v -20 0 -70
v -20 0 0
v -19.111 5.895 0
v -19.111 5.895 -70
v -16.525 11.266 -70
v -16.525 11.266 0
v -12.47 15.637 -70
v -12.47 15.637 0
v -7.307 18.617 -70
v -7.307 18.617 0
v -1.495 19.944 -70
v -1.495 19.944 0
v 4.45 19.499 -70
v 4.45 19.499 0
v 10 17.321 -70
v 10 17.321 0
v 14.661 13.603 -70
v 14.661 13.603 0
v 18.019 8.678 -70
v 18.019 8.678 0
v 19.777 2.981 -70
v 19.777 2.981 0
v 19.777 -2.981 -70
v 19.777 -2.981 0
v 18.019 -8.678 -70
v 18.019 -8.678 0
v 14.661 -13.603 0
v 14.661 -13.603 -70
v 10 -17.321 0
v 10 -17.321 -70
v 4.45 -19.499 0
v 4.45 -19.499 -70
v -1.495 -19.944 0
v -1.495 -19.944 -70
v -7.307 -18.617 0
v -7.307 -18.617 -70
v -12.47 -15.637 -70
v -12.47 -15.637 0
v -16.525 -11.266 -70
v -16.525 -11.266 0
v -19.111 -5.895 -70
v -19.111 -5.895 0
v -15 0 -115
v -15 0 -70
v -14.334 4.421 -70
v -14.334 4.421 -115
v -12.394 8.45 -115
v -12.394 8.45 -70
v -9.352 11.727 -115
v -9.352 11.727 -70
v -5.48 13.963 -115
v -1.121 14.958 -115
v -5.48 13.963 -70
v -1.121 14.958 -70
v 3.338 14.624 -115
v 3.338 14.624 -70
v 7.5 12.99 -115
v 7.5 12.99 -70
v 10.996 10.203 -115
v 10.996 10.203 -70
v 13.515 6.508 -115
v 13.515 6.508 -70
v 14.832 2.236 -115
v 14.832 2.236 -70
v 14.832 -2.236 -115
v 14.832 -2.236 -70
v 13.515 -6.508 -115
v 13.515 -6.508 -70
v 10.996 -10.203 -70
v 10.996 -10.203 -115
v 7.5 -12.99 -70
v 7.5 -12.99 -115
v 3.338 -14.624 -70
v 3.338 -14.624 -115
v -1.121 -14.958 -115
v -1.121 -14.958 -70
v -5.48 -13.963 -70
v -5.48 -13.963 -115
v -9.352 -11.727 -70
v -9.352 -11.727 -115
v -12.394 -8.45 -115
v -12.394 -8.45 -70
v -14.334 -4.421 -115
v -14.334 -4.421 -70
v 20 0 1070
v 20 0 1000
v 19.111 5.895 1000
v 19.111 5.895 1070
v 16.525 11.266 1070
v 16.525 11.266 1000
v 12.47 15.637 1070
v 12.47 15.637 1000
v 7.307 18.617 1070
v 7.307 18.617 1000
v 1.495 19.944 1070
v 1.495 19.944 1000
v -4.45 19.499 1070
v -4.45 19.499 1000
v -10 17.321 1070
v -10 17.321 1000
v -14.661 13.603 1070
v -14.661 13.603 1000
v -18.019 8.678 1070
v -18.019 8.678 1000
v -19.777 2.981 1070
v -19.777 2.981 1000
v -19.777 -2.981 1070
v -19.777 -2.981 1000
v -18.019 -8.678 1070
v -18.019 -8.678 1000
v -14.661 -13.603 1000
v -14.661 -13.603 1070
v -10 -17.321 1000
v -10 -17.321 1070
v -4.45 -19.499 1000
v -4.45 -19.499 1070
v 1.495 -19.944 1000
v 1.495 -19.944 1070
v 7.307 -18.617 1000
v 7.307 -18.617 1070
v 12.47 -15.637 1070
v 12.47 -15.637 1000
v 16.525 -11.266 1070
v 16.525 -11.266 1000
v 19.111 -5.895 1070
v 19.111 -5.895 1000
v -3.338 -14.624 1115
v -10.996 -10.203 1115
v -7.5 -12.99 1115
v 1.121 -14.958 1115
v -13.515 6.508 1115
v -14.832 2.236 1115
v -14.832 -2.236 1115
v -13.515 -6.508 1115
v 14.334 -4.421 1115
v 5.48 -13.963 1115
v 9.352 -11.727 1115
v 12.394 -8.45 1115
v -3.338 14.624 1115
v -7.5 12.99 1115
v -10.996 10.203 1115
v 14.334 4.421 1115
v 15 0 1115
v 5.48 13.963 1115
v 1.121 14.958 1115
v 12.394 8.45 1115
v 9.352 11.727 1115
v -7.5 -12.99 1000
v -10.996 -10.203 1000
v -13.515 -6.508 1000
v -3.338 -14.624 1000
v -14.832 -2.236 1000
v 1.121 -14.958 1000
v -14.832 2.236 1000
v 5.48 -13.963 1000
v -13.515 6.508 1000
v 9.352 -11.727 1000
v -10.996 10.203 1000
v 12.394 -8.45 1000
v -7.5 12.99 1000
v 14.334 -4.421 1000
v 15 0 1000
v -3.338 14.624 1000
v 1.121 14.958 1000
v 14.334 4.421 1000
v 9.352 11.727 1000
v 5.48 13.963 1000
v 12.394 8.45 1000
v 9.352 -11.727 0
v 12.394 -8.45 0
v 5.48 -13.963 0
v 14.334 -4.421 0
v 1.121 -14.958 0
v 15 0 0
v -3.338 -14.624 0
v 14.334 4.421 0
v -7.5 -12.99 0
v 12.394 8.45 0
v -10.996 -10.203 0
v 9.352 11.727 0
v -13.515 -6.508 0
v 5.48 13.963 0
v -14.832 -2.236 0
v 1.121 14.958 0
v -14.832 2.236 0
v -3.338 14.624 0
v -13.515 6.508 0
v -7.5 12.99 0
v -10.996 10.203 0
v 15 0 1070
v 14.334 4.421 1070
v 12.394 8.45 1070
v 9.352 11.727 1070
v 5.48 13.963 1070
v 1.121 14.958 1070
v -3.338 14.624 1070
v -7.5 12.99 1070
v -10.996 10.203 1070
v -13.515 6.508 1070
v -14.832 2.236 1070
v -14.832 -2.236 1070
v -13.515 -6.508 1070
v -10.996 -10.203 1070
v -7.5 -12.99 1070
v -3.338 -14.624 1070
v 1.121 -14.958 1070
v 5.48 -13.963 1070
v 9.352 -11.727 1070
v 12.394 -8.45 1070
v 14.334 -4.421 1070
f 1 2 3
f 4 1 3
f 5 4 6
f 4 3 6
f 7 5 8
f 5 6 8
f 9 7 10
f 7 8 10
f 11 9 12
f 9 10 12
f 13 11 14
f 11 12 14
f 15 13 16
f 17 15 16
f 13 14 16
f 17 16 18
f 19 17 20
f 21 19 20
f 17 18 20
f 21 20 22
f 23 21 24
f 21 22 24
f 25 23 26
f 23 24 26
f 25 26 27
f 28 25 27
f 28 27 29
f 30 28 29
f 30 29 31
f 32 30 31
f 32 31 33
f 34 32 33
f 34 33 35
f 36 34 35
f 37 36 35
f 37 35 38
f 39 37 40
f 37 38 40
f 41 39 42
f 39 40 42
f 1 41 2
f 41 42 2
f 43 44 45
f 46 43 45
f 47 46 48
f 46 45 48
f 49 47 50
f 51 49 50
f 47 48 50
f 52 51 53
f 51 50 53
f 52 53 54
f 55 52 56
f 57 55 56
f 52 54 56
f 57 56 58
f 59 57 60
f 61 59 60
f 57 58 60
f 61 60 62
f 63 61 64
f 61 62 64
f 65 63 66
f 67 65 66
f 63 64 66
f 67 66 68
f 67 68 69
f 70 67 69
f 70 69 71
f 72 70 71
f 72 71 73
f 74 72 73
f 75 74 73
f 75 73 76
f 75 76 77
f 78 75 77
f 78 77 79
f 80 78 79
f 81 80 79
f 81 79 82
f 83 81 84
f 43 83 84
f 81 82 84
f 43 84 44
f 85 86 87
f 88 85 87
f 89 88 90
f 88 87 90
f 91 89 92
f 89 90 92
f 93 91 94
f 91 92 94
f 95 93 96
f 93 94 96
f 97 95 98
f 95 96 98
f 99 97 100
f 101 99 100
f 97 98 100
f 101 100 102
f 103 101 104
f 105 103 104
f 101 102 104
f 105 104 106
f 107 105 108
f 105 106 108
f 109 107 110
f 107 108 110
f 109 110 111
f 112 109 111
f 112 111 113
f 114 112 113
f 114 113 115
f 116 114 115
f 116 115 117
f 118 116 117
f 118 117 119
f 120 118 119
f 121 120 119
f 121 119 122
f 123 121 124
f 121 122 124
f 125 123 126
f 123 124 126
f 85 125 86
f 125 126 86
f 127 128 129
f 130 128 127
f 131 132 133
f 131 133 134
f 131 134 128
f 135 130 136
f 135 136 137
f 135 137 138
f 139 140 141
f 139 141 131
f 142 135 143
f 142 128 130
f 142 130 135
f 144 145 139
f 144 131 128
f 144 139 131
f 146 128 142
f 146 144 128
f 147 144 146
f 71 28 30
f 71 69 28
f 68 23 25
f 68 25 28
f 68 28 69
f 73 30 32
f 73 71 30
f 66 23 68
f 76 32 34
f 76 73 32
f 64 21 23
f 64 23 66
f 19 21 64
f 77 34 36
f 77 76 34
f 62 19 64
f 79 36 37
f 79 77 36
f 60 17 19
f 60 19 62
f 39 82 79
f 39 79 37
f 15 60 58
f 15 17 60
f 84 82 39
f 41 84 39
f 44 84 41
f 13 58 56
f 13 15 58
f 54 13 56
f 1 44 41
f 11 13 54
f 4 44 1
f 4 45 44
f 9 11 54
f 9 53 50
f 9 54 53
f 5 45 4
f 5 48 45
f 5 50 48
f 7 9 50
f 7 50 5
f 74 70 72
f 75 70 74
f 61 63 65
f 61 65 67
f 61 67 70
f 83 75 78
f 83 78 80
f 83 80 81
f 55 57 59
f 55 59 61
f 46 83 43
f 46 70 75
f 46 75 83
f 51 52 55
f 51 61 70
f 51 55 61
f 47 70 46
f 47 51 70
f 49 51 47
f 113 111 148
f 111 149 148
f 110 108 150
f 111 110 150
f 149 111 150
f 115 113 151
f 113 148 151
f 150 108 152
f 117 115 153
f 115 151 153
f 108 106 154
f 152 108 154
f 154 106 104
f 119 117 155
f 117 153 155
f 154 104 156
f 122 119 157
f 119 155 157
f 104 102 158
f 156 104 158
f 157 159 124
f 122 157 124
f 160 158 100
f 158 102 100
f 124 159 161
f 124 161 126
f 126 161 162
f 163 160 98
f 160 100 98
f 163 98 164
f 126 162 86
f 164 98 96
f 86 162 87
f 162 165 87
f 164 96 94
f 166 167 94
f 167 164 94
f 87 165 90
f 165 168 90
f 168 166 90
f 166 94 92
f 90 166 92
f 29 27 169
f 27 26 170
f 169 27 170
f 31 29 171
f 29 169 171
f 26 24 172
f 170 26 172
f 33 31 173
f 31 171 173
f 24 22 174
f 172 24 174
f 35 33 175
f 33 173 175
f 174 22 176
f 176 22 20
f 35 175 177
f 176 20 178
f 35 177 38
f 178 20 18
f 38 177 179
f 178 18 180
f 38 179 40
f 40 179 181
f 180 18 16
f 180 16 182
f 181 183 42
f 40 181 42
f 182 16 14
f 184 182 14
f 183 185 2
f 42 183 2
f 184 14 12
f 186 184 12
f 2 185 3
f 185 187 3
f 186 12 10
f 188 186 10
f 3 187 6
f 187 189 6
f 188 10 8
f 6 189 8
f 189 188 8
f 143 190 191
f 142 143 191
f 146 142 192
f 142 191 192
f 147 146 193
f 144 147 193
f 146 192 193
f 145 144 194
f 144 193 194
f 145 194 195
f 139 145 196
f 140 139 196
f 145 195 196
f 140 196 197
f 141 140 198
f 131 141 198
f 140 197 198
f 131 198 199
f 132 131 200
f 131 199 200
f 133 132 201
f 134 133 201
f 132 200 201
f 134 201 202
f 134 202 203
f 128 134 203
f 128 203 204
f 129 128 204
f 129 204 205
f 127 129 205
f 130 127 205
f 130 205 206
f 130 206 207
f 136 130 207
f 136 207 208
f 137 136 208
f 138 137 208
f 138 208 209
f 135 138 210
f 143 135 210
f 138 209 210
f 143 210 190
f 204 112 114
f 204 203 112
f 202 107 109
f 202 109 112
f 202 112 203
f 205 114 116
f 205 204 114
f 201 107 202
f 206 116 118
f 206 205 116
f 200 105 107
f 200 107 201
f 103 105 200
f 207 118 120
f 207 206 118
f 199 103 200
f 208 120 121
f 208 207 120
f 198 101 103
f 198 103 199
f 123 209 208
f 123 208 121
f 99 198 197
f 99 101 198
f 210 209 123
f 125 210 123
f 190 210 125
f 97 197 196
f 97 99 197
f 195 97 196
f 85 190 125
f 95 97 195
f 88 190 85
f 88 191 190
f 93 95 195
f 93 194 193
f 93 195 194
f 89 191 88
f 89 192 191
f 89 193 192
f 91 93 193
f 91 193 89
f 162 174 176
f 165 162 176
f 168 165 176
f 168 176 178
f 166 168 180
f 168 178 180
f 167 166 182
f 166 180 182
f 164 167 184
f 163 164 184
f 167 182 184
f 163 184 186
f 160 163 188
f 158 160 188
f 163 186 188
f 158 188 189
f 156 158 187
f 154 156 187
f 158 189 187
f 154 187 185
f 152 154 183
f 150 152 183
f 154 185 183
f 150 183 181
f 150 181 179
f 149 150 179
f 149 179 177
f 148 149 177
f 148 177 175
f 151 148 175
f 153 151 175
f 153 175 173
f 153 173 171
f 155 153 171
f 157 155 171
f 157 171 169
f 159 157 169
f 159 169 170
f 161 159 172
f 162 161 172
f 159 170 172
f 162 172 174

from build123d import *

# Parameters (mm, degrees)
SKETCH1_R           = 15
BOSS_EXTRUDE1_DEPTH = 1000
SKETCH2_R           = 20
BOSS_EXTRUDE2_DEPTH = 70
SKETCH3_R           = 15
BOSS_EXTRUDE3_DEPTH = 45
SKETCH4_R           = 20
BOSS_EXTRUDE4_DEPTH = 70
SKETCH5_R           = 15
BOSS_EXTRUDE5_DEPTH = 45


with BuildPart() as part:
    # Sketch1 → Boss-Extrude1 (new body)
    with BuildSketch(Plane.XY):
        Circle(SKETCH1_R)
    extrude(amount=BOSS_EXTRUDE1_DEPTH)

    # Sketch2 → Boss-Extrude2 (add)
    with BuildSketch(Plane.XY.offset(1000)):
        Circle(SKETCH2_R)
    extrude(amount=BOSS_EXTRUDE2_DEPTH)

    # Sketch3 → Boss-Extrude3 (add)
    with BuildSketch(Plane.XY.offset(1070)):
        Circle(SKETCH3_R)
    extrude(amount=BOSS_EXTRUDE3_DEPTH)

    # Sketch4 → Boss-Extrude4 (add)
    with BuildSketch(Plane(origin=(0, 0, 0), x_dir=(-1, 0, 0), z_dir=(0, 0, -1))):
        Circle(SKETCH4_R)
    extrude(amount=BOSS_EXTRUDE4_DEPTH)

    # Sketch5 → Boss-Extrude5 (add)
    with BuildSketch(Plane(origin=(0, 0, -70), x_dir=(-1, 0, 0), z_dir=(0, 0, -1))):
        Circle(SKETCH5_R)
    extrude(amount=BOSS_EXTRUDE5_DEPTH)


solid = part.part
